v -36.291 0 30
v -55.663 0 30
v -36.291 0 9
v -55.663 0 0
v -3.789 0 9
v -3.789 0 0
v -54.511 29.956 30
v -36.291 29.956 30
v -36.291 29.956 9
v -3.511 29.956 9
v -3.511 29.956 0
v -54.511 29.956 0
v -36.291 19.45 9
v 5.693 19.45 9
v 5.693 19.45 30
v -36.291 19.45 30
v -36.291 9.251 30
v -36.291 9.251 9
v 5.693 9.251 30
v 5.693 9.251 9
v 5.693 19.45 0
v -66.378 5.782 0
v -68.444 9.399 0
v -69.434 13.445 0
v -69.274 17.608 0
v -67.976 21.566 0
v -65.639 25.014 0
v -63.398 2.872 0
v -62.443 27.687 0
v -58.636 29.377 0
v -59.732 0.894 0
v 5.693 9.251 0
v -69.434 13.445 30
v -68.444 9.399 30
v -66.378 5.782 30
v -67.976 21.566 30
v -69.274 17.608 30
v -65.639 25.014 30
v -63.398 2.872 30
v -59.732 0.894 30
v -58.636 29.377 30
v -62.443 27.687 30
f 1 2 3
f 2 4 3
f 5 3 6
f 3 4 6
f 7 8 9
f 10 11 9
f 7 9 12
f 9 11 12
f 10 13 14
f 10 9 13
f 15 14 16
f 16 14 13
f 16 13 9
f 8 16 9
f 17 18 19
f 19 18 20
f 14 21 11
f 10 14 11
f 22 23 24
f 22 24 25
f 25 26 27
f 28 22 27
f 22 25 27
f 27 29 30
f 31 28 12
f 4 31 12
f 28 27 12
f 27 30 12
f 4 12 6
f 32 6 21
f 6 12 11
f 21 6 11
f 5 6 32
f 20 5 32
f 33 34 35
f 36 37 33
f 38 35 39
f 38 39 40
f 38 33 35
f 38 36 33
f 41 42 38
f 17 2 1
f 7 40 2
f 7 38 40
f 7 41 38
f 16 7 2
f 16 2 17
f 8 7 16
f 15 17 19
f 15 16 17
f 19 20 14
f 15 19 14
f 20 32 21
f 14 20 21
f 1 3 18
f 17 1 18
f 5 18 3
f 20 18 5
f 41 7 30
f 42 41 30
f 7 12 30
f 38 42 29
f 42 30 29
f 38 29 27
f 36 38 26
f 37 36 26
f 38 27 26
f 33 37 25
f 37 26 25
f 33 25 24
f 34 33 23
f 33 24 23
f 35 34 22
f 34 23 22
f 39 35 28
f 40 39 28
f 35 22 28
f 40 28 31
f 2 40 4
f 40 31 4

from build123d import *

# Parameters (mm, degrees)
F1_DEPTH = 9
F3_DEPTH = 21


with BuildPart() as f1:
    # F0 (on Top) → F1 (new body)
    with BuildSketch(Plane.XY):
        with BuildLine():
            Line((5.692772, 19.450301), (-3.510716, 29.955687))
            Line((-3.510716, 29.955687), (-54.510716, 29.955687))
            ThreePointArc((-54.510716, 29.955687), (-69.499634, 15.532184), (-55.66286, 0))
            Line((-55.66286, 0), (-3.788572, 0))
            Line((-3.788572, 0), (5.692772, 9.250754))
            Line((5.692772, 9.250754), (5.692772, 19.450301))
        make_face()
    extrude(amount=F1_DEPTH)

    # F2 (on face) → F3 (join)
    with BuildSketch(Plane.XY.offset(9)):
        with BuildLine():
            Line((5.692772, 9.250754), (5.692772, 19.450301))
            Line((5.692772, 19.450301), (-36.291417, 19.450301))
            Line((-36.291417, 19.450301), (-36.291417, 29.955687))
            Line((-36.291417, 29.955687), (-54.510716, 29.955687))
            ThreePointArc((-54.510716, 29.955687), (-69.499634, 15.532184), (-55.66286, 0))
            Line((-55.66286, 0), (-36.291417, 0))
            Line((-36.291417, 0), (-36.291417, 9.250754))
            Line((-36.291417, 9.250754), (5.692772, 9.250754))
        make_face()
    extrude(amount=F3_DEPTH)


solid = f1.part
